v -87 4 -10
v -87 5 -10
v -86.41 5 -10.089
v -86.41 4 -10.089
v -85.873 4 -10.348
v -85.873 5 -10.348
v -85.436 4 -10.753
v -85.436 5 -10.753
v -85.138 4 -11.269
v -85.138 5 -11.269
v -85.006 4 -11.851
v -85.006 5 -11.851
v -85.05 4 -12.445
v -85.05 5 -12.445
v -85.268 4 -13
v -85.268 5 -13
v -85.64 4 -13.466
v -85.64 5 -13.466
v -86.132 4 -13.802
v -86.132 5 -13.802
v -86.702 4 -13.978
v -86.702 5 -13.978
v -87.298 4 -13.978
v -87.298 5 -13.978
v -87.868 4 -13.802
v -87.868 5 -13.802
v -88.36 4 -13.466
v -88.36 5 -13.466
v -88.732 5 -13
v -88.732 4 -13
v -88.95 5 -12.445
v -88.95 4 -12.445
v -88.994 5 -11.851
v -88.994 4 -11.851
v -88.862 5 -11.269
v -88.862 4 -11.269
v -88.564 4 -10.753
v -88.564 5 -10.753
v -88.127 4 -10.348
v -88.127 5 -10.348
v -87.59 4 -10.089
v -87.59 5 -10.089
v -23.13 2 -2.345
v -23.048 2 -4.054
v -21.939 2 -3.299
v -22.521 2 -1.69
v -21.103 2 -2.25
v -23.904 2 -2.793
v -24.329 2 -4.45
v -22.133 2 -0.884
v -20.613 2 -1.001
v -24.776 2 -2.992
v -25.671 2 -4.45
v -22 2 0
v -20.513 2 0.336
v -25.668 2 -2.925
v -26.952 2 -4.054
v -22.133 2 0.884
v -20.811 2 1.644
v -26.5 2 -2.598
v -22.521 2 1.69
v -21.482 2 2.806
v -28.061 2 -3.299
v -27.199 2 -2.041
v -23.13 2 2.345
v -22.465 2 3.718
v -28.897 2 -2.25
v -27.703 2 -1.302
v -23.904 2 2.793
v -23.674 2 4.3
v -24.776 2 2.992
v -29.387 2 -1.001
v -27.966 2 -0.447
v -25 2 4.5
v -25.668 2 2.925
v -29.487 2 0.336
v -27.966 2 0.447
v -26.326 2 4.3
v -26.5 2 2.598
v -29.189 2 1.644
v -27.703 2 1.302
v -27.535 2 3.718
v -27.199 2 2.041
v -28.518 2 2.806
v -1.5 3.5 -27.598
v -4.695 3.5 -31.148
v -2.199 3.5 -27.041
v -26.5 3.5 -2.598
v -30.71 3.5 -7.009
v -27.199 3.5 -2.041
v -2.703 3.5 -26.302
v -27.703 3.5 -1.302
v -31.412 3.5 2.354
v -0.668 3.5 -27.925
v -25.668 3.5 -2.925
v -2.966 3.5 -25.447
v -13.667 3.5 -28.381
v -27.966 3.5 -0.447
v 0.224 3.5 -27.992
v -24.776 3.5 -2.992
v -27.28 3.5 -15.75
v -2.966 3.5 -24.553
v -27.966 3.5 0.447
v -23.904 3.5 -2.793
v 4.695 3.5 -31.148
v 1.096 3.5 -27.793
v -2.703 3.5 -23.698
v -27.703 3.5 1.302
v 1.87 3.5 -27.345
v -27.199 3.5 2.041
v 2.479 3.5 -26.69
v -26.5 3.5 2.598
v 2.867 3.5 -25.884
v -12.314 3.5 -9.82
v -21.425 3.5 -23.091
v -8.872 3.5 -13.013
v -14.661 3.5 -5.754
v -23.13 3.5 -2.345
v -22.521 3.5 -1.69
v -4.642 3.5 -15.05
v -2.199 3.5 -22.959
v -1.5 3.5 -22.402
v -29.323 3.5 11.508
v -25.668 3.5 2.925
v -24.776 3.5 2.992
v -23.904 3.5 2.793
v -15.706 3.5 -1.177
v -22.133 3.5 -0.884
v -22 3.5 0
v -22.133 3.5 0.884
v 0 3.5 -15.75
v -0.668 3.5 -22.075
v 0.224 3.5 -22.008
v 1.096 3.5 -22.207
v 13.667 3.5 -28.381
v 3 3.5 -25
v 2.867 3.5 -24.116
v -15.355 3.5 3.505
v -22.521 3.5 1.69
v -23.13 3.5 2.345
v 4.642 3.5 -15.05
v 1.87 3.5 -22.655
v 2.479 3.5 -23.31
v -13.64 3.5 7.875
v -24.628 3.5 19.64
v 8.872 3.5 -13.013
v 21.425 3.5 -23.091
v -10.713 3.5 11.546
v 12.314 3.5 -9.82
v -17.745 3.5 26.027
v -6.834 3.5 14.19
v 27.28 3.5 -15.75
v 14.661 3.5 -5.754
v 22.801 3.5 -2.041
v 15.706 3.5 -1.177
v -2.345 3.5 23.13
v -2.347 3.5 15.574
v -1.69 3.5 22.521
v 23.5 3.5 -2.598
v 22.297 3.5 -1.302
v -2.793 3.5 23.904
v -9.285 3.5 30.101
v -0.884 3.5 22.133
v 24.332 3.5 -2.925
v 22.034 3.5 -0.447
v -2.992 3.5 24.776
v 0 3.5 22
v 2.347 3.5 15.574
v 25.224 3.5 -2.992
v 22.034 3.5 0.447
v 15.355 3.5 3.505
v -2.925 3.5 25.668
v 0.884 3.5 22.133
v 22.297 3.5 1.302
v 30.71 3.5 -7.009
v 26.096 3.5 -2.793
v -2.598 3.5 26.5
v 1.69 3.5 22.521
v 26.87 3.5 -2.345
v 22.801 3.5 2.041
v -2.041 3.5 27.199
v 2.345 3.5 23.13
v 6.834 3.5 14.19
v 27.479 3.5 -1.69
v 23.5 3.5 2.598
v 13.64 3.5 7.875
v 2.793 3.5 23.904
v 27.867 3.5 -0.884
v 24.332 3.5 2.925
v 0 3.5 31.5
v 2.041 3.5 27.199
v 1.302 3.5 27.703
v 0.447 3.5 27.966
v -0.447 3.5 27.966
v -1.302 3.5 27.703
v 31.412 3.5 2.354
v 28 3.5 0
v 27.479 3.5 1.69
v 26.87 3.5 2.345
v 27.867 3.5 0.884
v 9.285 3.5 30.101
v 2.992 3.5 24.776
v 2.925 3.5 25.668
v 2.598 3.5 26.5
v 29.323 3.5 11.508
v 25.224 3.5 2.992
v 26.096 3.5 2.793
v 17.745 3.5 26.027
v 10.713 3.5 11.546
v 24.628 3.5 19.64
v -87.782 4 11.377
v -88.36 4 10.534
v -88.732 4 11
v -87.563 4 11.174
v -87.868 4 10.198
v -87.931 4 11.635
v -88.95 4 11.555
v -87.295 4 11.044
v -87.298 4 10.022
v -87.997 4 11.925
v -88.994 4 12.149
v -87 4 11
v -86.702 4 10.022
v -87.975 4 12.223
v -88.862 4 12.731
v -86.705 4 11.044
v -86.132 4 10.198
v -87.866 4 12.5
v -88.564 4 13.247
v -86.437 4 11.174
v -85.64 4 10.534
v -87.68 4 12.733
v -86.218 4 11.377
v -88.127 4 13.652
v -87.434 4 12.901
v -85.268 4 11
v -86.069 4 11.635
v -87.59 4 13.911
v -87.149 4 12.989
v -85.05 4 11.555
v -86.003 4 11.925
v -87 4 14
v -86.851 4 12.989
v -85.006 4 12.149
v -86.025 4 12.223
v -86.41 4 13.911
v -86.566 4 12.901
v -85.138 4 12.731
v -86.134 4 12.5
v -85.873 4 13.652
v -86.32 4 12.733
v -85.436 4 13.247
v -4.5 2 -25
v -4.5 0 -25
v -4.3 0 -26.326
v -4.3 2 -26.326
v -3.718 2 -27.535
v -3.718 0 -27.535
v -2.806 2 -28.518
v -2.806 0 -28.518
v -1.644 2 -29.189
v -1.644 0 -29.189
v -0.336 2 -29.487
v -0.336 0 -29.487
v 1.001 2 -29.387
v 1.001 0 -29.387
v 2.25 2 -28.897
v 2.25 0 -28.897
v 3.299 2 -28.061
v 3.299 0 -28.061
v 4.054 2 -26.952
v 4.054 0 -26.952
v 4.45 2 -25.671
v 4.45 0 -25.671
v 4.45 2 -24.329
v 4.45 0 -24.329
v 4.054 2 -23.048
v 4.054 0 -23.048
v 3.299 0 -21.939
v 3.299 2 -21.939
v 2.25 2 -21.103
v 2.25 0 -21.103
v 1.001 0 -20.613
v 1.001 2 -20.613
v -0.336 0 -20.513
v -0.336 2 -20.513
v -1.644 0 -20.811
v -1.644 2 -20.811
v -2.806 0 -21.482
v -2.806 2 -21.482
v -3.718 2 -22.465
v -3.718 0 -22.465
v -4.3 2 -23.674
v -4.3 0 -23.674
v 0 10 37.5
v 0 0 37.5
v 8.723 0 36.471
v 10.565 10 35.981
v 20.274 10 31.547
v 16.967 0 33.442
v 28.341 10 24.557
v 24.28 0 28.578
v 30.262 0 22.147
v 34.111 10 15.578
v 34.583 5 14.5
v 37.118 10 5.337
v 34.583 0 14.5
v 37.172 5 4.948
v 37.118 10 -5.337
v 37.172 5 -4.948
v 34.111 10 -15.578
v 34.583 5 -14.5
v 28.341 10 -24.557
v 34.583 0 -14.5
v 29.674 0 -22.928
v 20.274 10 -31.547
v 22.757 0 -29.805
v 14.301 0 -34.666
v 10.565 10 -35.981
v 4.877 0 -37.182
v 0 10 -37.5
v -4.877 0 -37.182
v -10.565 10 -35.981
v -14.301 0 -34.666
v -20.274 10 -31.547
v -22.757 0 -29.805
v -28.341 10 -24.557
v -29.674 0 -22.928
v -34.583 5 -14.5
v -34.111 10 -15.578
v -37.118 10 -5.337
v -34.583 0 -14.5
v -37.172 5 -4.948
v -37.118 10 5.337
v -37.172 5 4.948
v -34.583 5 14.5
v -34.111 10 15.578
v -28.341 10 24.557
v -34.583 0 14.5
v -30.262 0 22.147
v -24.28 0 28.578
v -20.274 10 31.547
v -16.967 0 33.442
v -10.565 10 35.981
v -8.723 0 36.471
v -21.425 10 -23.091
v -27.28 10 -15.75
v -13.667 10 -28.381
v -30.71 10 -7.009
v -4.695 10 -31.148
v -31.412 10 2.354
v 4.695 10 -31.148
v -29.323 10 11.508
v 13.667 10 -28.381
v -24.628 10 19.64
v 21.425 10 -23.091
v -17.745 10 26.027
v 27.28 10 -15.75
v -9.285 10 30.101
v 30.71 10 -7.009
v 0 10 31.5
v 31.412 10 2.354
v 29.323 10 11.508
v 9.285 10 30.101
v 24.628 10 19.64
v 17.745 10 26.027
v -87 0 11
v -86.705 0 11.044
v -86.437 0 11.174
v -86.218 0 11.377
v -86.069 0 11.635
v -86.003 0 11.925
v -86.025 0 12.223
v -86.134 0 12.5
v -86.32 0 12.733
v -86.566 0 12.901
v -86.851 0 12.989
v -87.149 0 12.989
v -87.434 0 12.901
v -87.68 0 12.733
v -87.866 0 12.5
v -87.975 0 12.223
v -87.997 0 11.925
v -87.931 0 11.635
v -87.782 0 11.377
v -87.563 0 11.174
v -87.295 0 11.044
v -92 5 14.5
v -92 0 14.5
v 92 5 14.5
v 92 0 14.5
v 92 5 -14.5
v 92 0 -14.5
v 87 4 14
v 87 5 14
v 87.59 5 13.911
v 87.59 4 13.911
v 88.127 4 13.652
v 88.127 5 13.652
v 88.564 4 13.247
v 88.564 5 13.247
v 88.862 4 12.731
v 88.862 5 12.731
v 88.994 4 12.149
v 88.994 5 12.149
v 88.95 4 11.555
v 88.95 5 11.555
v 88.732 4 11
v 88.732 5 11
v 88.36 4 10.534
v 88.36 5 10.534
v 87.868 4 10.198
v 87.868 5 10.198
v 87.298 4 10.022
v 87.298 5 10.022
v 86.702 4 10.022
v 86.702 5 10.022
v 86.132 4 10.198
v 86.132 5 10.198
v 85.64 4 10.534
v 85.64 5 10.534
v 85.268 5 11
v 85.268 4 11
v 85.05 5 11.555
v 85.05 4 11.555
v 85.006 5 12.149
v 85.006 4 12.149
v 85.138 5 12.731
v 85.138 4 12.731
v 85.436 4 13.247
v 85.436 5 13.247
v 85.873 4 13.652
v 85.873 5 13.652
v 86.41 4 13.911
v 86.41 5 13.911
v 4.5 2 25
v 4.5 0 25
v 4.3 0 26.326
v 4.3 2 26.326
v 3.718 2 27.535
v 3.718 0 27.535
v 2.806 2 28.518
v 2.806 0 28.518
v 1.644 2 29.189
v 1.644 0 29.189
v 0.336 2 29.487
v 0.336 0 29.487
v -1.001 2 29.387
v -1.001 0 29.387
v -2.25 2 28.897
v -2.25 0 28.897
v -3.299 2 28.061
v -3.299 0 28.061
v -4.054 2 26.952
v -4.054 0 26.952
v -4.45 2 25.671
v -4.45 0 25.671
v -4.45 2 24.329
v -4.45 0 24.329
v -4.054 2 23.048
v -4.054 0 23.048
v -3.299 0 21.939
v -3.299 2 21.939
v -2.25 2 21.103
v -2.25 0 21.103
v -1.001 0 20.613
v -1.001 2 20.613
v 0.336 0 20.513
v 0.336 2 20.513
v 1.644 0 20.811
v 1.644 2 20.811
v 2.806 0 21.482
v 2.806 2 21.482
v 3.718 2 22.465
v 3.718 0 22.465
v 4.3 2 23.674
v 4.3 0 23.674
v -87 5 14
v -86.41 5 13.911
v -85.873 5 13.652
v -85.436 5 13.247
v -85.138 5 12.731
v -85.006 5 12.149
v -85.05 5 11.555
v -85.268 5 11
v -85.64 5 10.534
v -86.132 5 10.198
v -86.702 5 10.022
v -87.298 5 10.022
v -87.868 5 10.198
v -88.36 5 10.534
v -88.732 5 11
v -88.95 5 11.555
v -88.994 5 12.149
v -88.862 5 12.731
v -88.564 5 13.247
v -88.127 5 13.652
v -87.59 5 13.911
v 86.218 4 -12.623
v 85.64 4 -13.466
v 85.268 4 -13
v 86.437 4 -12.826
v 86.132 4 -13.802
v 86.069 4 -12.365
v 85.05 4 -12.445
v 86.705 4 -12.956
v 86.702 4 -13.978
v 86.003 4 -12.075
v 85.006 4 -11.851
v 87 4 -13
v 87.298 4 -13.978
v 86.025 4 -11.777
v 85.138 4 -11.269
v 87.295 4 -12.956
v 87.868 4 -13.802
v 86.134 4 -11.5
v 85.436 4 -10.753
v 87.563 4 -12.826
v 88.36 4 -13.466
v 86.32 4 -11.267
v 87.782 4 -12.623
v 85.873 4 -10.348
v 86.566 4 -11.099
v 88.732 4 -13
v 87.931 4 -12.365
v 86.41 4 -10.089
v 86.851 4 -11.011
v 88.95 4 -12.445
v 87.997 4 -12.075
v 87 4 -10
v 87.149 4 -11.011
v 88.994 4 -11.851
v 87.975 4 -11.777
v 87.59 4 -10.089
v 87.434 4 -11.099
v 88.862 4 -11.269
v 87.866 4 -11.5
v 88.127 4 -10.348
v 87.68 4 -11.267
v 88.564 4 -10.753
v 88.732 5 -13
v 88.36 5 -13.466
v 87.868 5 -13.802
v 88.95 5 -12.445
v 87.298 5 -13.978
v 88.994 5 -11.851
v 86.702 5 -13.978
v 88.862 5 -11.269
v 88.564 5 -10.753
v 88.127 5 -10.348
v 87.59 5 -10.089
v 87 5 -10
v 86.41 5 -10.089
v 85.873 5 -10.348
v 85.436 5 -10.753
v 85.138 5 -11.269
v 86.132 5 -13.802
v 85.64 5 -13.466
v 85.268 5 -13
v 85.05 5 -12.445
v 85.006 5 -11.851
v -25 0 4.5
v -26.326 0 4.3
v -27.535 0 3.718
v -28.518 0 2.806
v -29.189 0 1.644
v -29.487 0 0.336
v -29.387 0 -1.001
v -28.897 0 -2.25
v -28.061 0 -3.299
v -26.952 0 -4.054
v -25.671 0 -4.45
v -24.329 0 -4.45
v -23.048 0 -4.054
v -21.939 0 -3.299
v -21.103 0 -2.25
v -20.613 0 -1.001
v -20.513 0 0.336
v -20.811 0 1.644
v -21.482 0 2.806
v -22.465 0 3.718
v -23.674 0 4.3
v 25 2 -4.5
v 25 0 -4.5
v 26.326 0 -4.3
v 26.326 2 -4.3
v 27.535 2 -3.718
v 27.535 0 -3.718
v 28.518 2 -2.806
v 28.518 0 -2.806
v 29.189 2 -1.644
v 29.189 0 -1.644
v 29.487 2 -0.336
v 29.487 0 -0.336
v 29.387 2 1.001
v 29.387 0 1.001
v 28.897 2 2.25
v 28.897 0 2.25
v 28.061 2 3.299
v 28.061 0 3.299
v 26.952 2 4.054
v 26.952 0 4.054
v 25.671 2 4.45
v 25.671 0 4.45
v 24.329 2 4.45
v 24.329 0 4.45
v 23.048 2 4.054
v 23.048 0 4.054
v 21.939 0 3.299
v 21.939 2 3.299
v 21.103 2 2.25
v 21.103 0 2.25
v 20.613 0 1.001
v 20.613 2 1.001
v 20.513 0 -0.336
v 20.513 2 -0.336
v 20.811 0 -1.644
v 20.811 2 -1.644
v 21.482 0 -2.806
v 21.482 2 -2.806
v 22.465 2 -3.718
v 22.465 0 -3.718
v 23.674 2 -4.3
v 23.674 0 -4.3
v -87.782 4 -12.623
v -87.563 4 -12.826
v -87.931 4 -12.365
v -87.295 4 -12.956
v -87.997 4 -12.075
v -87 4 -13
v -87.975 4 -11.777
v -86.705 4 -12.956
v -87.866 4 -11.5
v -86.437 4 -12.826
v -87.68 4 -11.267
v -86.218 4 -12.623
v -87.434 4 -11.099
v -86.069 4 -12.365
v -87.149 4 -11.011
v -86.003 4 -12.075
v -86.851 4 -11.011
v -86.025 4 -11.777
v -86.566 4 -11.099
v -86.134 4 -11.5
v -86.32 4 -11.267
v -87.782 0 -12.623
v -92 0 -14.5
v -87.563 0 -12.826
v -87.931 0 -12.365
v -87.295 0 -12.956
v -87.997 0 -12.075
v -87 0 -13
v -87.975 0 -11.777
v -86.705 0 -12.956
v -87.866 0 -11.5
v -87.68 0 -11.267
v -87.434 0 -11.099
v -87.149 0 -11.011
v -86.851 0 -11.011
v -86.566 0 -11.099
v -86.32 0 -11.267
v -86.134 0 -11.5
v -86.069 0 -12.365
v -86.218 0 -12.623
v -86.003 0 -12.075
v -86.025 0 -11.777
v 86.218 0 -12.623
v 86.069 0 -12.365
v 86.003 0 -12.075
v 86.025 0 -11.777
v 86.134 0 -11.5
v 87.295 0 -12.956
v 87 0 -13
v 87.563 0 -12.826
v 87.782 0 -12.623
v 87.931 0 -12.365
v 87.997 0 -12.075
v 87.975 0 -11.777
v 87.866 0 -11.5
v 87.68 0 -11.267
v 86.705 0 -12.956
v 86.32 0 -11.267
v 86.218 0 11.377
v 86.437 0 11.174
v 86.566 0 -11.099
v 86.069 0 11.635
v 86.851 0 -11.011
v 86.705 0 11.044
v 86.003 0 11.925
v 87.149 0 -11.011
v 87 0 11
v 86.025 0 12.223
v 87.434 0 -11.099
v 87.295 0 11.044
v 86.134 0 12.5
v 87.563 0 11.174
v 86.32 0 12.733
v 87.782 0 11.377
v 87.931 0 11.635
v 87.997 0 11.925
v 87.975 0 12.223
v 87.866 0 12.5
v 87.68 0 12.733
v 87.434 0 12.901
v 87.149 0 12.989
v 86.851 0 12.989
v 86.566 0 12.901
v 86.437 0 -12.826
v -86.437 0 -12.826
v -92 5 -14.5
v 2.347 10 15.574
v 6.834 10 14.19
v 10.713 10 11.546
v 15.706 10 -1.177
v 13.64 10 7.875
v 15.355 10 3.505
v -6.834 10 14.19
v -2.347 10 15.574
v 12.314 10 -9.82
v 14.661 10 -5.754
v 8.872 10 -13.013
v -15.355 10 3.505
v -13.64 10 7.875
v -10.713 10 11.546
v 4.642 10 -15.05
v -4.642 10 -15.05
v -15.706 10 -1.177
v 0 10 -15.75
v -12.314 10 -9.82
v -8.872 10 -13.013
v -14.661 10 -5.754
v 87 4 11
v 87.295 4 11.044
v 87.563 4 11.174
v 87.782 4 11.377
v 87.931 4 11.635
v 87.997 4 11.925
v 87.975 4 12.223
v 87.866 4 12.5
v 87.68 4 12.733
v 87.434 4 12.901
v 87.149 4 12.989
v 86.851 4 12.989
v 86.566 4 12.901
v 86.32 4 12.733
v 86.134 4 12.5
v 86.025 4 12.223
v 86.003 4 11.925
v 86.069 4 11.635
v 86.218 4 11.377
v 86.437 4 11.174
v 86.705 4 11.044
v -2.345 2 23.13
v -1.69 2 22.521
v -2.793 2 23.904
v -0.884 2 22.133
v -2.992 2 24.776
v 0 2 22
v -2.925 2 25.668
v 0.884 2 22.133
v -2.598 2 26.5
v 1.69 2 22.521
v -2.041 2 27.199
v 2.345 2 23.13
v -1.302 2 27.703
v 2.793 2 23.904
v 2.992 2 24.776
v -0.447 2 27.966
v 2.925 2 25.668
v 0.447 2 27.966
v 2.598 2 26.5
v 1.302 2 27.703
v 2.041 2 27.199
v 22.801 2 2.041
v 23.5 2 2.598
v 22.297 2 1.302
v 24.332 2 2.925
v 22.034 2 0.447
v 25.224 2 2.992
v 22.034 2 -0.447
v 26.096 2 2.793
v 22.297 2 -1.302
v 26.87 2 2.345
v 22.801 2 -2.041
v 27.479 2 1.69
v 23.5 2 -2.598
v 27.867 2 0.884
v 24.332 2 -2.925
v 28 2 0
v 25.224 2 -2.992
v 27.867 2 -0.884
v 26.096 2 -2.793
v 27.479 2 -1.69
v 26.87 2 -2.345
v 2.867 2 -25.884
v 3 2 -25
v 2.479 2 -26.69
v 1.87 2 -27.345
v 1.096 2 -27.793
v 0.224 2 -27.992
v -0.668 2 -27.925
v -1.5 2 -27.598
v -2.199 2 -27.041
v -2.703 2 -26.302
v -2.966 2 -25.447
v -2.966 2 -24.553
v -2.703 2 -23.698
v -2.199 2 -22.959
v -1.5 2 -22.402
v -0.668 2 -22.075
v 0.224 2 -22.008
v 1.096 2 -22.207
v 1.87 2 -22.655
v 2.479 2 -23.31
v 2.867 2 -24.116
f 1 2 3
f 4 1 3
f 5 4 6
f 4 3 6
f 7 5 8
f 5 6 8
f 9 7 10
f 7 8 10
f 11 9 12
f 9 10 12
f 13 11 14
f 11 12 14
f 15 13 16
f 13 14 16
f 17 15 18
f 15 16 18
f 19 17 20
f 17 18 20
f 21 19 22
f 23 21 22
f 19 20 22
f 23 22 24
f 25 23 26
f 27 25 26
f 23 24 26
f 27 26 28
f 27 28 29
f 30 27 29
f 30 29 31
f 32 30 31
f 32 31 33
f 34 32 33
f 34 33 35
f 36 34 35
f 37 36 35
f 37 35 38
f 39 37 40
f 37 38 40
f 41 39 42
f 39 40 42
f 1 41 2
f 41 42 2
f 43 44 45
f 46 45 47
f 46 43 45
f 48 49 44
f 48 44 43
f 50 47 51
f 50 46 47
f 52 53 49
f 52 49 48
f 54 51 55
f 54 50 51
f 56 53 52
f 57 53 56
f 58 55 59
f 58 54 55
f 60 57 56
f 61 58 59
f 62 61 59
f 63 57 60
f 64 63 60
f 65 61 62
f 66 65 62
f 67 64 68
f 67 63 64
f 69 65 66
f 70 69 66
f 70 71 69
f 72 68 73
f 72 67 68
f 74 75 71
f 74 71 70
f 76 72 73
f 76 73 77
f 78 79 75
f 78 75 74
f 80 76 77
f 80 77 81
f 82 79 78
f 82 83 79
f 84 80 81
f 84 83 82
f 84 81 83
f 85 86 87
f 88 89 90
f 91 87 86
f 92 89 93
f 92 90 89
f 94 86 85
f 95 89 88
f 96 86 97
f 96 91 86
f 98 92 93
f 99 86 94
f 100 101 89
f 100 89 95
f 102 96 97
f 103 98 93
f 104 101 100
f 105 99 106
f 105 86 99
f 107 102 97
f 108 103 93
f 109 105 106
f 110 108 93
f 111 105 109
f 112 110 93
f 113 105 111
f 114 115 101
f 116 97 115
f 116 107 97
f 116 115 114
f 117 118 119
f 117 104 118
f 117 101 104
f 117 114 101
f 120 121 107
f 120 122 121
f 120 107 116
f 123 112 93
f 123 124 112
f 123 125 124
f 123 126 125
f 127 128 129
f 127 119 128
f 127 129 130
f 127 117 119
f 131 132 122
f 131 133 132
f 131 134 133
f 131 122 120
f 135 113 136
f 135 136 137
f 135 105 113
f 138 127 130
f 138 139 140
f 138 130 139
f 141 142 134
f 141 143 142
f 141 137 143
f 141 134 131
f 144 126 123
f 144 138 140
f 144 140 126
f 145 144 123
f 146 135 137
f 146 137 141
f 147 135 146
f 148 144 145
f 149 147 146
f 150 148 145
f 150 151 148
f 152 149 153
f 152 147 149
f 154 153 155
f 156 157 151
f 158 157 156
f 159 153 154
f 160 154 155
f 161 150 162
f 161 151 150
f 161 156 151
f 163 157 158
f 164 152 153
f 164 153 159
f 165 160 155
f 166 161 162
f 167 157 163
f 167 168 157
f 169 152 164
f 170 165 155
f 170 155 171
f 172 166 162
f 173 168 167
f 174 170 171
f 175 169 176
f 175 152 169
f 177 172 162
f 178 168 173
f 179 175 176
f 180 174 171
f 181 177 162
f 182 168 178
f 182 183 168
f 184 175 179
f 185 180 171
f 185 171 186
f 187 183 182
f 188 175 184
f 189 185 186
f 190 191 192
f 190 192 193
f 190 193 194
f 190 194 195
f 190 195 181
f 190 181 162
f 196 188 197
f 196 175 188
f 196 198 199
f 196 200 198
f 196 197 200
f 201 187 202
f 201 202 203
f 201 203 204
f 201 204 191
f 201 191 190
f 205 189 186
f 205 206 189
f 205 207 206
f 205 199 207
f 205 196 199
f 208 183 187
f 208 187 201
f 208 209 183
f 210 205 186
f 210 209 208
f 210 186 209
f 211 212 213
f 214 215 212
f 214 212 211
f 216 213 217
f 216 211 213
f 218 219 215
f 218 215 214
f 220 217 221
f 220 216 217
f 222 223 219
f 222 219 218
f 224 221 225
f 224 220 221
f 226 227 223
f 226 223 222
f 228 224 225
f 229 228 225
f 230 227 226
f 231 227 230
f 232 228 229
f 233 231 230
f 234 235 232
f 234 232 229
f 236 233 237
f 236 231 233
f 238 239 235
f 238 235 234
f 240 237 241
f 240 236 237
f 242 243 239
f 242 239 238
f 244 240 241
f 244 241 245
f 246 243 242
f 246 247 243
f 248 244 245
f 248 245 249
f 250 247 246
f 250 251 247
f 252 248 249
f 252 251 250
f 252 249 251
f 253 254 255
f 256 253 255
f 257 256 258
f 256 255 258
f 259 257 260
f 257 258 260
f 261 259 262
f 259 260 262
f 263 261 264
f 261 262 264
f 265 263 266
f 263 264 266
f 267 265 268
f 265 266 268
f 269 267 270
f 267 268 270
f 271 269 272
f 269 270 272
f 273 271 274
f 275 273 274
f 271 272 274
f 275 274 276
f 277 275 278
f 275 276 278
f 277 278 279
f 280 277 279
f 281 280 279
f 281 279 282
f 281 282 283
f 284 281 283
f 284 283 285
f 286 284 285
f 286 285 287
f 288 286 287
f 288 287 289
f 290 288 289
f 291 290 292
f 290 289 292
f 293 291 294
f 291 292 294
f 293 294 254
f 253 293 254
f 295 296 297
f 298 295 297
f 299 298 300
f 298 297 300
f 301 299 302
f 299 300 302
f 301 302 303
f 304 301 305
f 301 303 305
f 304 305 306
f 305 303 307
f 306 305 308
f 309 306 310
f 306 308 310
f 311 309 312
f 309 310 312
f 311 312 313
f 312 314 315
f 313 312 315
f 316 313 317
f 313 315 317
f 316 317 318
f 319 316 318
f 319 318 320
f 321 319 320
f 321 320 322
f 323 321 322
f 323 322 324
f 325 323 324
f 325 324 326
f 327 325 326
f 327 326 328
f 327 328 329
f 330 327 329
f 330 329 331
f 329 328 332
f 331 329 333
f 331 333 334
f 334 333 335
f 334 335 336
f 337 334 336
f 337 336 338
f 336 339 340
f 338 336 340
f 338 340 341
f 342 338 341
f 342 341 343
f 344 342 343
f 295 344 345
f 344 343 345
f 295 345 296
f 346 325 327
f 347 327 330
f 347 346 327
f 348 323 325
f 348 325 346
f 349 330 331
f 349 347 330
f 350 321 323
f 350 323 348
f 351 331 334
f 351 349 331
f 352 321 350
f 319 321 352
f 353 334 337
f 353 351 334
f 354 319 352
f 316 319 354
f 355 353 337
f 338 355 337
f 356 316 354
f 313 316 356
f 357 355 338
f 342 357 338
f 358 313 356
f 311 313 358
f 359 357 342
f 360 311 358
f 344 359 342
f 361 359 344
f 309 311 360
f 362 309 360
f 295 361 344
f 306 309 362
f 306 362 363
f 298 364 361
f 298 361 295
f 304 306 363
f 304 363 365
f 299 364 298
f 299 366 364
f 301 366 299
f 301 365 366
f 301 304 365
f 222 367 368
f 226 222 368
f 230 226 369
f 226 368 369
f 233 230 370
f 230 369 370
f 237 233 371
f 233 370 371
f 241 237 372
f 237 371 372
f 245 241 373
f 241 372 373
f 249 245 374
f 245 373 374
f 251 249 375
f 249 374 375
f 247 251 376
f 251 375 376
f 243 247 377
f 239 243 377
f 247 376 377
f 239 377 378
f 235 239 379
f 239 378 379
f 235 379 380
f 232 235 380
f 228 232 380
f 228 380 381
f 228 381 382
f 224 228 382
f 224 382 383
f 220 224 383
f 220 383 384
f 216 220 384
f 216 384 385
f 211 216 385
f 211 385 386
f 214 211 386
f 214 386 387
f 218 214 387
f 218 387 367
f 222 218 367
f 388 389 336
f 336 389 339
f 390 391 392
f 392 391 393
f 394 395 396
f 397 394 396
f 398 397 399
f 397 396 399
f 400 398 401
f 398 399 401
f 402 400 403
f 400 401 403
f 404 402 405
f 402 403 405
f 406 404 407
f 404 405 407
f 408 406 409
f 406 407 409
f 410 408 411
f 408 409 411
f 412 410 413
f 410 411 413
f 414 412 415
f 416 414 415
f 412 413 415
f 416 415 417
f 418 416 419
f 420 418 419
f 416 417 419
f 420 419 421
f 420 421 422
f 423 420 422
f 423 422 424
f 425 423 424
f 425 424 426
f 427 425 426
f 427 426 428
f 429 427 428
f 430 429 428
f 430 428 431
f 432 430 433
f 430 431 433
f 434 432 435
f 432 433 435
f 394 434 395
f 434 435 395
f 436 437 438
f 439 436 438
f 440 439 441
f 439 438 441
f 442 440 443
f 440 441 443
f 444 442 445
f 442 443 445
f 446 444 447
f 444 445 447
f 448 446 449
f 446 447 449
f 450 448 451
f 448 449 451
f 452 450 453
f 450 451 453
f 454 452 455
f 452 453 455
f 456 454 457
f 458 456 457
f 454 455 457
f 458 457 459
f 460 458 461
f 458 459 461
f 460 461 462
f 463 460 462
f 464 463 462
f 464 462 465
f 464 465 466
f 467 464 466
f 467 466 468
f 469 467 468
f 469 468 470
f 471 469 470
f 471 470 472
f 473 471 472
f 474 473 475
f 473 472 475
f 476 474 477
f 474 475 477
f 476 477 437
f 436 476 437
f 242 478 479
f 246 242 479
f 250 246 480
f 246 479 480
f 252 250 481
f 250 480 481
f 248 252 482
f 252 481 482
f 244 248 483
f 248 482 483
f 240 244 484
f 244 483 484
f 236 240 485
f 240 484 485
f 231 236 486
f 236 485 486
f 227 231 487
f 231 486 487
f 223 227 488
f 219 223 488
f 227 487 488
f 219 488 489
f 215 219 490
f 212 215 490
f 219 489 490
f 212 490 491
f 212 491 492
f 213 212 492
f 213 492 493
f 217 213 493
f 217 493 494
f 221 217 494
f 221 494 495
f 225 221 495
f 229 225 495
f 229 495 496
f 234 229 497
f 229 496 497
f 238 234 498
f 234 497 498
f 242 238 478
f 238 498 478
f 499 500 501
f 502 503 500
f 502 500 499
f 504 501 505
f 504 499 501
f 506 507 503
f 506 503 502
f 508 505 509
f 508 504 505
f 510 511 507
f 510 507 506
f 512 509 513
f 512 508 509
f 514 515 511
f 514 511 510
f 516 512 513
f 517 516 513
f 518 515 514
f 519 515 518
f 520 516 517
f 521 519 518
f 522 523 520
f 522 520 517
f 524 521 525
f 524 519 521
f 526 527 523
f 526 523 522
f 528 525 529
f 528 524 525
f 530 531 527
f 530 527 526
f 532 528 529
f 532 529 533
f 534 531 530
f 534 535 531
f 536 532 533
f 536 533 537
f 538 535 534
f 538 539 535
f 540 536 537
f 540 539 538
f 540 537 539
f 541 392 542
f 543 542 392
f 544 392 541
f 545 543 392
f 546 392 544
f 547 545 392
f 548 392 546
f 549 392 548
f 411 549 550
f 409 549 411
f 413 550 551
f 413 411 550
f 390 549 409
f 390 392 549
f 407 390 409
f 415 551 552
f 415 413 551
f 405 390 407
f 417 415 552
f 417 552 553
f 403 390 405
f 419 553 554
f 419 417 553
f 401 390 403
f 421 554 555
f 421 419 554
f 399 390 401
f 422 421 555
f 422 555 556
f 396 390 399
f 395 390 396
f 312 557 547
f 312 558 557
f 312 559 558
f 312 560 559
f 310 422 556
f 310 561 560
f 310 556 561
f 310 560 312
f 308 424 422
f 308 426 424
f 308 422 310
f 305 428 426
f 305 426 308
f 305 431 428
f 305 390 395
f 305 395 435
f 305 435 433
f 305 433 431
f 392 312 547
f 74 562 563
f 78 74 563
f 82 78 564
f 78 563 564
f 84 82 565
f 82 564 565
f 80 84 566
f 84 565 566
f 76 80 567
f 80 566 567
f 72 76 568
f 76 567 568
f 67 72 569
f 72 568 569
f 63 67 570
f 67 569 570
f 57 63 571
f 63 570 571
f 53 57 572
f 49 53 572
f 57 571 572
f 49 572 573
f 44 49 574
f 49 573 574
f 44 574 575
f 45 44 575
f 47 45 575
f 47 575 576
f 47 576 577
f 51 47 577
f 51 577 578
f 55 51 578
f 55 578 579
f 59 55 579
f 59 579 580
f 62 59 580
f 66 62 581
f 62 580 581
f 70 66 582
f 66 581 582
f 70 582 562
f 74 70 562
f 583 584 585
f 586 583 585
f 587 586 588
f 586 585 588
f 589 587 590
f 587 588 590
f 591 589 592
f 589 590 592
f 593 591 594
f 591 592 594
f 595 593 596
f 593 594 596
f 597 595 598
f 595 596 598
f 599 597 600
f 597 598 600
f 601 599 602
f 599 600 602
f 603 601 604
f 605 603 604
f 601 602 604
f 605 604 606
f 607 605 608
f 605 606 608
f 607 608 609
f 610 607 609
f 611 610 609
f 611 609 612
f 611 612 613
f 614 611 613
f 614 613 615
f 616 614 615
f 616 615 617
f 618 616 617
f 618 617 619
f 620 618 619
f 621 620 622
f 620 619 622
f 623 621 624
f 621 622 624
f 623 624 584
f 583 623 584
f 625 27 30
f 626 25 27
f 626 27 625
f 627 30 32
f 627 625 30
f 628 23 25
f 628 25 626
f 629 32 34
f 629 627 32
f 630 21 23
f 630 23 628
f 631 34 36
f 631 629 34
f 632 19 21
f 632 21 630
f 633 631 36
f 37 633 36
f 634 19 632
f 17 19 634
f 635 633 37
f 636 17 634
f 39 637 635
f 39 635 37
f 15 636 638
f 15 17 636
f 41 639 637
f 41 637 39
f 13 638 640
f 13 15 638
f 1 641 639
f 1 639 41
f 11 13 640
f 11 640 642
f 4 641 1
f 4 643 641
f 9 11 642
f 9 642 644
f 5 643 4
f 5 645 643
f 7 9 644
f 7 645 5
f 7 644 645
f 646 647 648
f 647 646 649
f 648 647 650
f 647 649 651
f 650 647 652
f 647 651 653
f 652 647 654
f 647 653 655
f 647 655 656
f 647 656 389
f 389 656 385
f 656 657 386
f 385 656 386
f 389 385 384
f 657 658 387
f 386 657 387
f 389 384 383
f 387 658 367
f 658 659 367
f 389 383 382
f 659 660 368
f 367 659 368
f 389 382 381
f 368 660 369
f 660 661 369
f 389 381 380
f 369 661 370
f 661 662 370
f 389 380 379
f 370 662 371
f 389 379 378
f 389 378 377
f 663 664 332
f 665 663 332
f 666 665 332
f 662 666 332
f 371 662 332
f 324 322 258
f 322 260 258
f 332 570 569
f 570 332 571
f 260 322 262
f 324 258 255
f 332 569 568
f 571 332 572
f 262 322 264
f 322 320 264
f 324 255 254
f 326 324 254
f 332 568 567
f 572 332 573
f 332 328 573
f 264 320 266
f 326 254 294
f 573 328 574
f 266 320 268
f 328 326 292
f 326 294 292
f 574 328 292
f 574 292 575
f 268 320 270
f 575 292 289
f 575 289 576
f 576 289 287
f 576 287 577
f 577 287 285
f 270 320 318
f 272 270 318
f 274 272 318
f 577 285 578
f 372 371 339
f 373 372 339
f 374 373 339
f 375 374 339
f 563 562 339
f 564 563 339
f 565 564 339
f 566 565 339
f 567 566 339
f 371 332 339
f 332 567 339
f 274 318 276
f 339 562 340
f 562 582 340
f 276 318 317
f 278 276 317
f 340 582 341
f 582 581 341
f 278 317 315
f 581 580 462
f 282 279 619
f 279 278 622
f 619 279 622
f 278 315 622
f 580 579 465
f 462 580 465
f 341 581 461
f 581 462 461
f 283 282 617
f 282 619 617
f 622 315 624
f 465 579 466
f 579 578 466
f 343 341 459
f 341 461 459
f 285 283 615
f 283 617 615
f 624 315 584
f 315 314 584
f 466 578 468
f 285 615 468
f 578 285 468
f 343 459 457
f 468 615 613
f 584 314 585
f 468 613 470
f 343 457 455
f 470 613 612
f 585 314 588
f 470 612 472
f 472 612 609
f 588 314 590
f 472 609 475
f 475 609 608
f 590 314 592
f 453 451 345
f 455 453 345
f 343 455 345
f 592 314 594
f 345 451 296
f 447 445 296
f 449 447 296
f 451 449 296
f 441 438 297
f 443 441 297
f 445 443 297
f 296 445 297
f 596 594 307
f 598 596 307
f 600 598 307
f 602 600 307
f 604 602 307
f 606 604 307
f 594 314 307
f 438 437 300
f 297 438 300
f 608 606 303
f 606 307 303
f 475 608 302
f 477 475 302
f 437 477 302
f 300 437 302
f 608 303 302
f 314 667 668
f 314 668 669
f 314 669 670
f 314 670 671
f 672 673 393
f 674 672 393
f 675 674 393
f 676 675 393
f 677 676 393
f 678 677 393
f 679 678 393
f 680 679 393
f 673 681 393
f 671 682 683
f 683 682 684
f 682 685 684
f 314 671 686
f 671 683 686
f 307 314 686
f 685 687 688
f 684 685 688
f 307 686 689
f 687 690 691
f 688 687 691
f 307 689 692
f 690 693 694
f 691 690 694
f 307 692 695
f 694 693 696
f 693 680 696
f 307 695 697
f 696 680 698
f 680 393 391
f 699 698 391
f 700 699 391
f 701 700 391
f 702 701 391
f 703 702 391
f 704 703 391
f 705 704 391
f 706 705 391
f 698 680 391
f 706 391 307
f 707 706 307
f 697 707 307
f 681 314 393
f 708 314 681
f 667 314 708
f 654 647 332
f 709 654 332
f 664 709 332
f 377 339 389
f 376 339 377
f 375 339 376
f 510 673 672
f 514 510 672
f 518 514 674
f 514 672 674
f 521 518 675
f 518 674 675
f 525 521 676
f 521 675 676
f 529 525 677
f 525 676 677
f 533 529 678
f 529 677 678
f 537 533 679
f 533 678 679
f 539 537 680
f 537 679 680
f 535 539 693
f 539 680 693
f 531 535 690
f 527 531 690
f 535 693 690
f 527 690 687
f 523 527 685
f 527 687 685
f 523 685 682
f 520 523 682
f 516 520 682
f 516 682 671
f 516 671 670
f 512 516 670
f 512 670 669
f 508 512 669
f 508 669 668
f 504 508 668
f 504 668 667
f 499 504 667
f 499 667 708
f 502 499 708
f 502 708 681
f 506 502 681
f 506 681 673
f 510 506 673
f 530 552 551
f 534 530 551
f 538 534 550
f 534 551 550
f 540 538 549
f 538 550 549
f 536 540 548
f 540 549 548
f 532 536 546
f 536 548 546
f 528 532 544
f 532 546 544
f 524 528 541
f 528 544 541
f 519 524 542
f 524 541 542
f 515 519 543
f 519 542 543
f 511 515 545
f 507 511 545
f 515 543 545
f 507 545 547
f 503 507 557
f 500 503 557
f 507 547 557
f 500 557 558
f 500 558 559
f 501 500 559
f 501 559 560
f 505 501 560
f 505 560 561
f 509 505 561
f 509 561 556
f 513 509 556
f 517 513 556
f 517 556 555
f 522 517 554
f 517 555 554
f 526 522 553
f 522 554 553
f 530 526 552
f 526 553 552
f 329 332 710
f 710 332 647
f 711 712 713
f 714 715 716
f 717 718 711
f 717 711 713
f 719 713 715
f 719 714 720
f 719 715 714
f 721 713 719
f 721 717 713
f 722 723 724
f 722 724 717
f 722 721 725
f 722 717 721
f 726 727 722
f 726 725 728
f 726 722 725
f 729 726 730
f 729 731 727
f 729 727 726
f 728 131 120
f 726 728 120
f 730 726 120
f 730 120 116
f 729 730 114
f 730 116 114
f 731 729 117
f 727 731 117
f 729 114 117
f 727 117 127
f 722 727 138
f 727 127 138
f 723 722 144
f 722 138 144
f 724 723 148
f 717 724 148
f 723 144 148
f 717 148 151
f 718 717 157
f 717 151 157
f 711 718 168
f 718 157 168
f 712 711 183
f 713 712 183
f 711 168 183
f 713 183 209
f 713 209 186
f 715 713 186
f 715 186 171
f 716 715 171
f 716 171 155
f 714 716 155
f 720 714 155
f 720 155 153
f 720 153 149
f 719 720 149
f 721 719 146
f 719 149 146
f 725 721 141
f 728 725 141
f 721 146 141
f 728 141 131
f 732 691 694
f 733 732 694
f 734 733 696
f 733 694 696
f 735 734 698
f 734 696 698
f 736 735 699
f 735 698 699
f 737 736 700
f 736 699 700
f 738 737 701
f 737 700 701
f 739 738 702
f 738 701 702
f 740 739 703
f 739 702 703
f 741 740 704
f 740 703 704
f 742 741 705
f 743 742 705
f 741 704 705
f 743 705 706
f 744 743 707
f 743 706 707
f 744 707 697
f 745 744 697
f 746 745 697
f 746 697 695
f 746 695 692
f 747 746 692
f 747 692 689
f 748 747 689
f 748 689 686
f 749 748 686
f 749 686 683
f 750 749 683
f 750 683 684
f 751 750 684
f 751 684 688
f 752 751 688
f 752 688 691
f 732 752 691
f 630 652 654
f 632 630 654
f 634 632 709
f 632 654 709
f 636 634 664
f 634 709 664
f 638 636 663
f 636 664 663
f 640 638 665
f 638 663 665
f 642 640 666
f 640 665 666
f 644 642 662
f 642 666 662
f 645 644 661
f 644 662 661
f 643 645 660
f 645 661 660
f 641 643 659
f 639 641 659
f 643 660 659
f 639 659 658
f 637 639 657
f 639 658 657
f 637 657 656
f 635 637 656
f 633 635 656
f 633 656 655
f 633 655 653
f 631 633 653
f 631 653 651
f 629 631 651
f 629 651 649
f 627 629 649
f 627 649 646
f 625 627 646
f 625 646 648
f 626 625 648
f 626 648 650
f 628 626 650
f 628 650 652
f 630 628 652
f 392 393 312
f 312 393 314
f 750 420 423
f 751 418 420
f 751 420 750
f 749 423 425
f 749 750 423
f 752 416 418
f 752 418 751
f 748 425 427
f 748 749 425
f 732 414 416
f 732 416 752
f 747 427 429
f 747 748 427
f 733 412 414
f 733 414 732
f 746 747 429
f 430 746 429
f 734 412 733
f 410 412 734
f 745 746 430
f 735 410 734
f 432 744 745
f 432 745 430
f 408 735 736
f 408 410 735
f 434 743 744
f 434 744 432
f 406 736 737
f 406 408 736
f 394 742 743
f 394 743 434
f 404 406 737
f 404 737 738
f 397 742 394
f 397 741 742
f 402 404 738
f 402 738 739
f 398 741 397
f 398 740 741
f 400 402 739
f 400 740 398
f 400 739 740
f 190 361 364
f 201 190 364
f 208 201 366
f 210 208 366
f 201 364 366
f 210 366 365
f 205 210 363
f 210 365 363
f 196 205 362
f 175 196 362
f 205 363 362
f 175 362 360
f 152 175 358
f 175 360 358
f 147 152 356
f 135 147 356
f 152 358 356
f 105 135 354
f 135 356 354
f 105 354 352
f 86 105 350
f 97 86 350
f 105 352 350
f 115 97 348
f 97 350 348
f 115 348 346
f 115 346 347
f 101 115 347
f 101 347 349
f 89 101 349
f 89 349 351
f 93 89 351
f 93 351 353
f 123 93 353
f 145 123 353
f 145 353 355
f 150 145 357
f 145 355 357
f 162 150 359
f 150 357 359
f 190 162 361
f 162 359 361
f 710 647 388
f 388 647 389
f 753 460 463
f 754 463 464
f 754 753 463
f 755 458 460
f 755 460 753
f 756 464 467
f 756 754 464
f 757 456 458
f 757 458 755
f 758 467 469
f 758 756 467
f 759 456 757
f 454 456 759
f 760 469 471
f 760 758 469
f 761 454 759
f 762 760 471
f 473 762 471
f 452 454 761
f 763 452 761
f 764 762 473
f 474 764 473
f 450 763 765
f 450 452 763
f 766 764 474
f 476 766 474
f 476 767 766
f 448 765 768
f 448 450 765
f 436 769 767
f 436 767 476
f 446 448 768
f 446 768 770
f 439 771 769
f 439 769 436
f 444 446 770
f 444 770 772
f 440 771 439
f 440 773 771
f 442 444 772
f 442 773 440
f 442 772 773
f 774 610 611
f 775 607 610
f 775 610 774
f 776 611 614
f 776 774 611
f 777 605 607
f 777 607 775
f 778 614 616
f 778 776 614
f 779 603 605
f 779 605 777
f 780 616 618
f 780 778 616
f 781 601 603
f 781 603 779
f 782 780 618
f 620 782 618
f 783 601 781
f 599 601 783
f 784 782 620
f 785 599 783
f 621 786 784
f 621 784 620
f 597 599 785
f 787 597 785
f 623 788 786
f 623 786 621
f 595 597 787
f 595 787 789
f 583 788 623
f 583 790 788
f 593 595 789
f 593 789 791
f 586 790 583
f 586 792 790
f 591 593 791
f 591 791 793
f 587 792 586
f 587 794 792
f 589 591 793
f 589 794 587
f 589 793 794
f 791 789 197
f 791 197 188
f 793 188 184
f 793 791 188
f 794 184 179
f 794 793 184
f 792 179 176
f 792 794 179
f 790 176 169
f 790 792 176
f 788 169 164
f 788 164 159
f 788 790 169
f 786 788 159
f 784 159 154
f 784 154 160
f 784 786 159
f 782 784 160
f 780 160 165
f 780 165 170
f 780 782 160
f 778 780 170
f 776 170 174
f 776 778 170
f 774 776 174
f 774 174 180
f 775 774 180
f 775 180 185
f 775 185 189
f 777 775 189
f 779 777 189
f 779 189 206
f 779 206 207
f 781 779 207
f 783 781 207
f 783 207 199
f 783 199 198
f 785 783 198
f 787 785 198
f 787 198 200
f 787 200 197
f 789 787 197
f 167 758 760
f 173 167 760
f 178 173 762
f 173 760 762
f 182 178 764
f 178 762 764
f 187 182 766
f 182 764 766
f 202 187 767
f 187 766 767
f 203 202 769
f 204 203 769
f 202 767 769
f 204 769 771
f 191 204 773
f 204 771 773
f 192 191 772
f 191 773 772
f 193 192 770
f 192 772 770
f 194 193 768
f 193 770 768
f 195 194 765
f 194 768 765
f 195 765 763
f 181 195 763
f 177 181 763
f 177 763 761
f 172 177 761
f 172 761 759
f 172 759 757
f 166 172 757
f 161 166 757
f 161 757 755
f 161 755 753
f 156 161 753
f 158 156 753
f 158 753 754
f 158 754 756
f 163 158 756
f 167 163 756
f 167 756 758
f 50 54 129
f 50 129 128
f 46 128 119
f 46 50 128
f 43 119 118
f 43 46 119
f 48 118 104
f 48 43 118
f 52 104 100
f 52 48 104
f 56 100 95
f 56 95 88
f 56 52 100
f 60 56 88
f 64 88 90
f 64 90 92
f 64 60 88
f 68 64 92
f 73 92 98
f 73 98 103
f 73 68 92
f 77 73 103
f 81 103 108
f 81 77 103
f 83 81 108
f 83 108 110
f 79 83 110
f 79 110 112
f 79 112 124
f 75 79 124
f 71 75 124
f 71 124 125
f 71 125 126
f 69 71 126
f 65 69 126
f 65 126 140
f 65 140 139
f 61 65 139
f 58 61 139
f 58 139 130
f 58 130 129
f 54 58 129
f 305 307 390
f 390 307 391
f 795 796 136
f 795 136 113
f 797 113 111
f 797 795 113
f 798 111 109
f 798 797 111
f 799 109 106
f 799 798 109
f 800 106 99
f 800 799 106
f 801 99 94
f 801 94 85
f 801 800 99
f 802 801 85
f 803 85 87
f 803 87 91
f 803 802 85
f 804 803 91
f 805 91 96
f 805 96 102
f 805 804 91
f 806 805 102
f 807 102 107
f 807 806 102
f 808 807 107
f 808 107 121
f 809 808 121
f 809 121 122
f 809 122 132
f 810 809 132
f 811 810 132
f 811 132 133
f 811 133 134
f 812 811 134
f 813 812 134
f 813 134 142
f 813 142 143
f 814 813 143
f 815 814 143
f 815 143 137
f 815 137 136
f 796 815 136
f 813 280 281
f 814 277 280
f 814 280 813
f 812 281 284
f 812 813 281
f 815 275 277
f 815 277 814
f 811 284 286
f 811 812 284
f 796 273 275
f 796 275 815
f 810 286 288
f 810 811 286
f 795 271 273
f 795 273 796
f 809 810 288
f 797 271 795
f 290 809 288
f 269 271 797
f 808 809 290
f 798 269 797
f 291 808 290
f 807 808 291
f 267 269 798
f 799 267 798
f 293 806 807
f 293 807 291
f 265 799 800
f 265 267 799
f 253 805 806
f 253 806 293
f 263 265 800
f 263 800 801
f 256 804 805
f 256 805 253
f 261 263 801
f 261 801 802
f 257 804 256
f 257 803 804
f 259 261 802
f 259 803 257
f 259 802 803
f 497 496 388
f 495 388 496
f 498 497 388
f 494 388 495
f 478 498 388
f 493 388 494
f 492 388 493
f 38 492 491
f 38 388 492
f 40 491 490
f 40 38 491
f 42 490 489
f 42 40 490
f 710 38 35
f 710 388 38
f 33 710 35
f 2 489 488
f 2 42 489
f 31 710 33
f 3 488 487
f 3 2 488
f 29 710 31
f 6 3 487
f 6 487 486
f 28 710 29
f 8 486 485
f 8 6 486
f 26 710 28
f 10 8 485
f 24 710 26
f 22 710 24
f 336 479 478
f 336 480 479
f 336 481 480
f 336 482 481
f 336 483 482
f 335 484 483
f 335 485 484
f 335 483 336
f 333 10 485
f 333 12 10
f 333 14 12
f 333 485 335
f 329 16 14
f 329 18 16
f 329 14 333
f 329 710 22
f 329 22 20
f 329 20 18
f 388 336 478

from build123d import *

# Parameters (mm, degrees)
SKETCH1_R             = 37.5
BOSS_EXTRUDE1_DEPTH   = 10
SKETCH2_R             = 31.5
CUT_EXTRUDE1_DEPTH    = 6.5
SKETCH4_R             = 15.75
BOSS_EXTRUDE2_DEPTH   = 6.5
SKETCH5_R             = 3
CUT_EXTRUDE2_DEPTH    = 3.5
CIRPATTERN3_OUTLINE_R = 3
CIRPATTERN3_DEPTH     = 3.5
BOSS_EXTRUDE3_DEPTH   = 5
CIRPATTERN4_COUNT     = 4
SKETCH9_R             = 4.5
CUT_EXTRUDE3_DEPTH    = 2
CIRPATTERN5_COUNT     = 4
SKETCH10_R            = 1
CUT_EXTRUDE4_DEPTH    = 5
LPATTERN1_COUNT       = 2
LPATTERN1_PITCH       = 174
LPATTERN1_COUNT_DIR2  = 2
LPATTERN1_PITCH_DIR2  = 24
SKETCH11_R            = 2
CUT_EXTRUDE5_DEPTH    = 1
LPATTERN2_COUNT       = 2
LPATTERN2_PITCH       = 174
LPATTERN2_COUNT_DIR2  = 2
LPATTERN2_PITCH_DIR2  = 24


# Read off the part's stored shape, not the designer's step: CirPattern3
with BuildPart() as part:
    # Sketch1 → Boss-Extrude1 (new body)
    with BuildSketch(Plane(origin=(0, 0, 0), x_dir=(1, 0, 0), z_dir=(0, 1, 0))):
        with Locations(Location((0, 0, 0), (0, 0, 270))):
            Circle(SKETCH1_R)
    extrude(amount=BOSS_EXTRUDE1_DEPTH)

    # Sketch2 → Cut-Extrude1 (cut)
    with BuildSketch(Plane(origin=(0, 10, 0), x_dir=(1, 0, 0), z_dir=(0, 1, 0))):
        with Locations(Location((0, 0, 0), (0, 0, 270))):
            Circle(SKETCH2_R)
    extrude(amount=-CUT_EXTRUDE1_DEPTH, mode=Mode.SUBTRACT)

    # Sketch4 → Boss-Extrude2 (add)
    with BuildSketch(Plane(origin=(0, 3.5, 0), x_dir=(1, 0, 0), z_dir=(0, 1, 0))):
        with Locations(Location((0, 0, 0), (0, 0, 90))):
            Circle(SKETCH4_R)
    extrude(amount=BOSS_EXTRUDE2_DEPTH)

    # Sketch5 → Cut-Extrude2 (cut)
    with BuildSketch(Plane.XZ):
        with Locations(Location((0, 25, 0), (0, 0, 270))):
            Circle(SKETCH5_R)
    extrude(amount=-CUT_EXTRUDE2_DEPTH, mode=Mode.SUBTRACT)

    # CirPattern3 outline → CirPattern3 (cut)
    with BuildSketch(Plane(origin=(0, 0, 0), x_dir=(1, 0, 0), z_dir=(0, 1, 0))):
        with Locations((-25, 0)):
            Circle(CIRPATTERN3_OUTLINE_R)
        with Locations((0, 25)):
            Circle(CIRPATTERN3_OUTLINE_R)
        with Locations((25, 0)):
            Circle(CIRPATTERN3_OUTLINE_R)
    extrude(amount=CIRPATTERN3_DEPTH, mode=Mode.SUBTRACT)

    # Sketch7 → Boss-Extrude3 (add)
    with BuildSketch(Plane.XZ):
        with BuildLine():
            Line((34.583232932, 14.5), (92.000000002, 14.5))
            Line((92.000000002, 14.5), (92.000000002, -14.5))
            Line((92.000000002, -14.5), (34.583232932, -14.5))
            ThreePointArc((34.583232932, -14.5), (37.5, 0), (34.583232932, 14.5))
        make_face()
    boss_extrude3 = extrude(amount=-BOSS_EXTRUDE3_DEPTH)

    # CirPattern4: Boss-Extrude3 ×4 about axis, 2 skipped
    cirpattern4_axis = Axis((0, 0, 0), (0, 1, 0))
    add([boss_extrude3.rotate(cirpattern4_axis, i * 360 / CIRPATTERN4_COUNT) for i in range(1, CIRPATTERN4_COUNT) if i not in (1, 3)])

    # Sketch9 → Cut-Extrude3 (cut)
    with BuildSketch(Plane.XZ):
        with Locations(Location((25, 0, 0), (0, 0, 270))):
            Circle(SKETCH9_R)
    cut_extrude3 = extrude(amount=-CUT_EXTRUDE3_DEPTH, mode=Mode.SUBTRACT)

    # CirPattern5: Cut-Extrude3 ×4 about axis
    cirpattern5_axis = Axis((0, 0, 0), (0, 1, 0))
    for i in range(1, CIRPATTERN5_COUNT):
        add(cut_extrude3.rotate(cirpattern5_axis, i * 360 / CIRPATTERN5_COUNT), mode=Mode.SUBTRACT)

    # Sketch10 → Cut-Extrude4 (cut)
    with BuildSketch(Plane(origin=(0, 0, 0), x_dir=(-1, 0, 0), z_dir=(0, -1, 0))):
        with Locations(Location((-87, -12, 0), (0, 0, 90))):
            Circle(SKETCH10_R)
    cut_extrude4 = extrude(amount=-CUT_EXTRUDE4_DEPTH, mode=Mode.SUBTRACT)

    # LPattern1: Cut-Extrude4 2 × 2
    with Locations(*[(-i * LPATTERN1_PITCH, 0, -j * LPATTERN1_PITCH_DIR2) for i in range(LPATTERN1_COUNT) for j in range(LPATTERN1_COUNT_DIR2) if (i, j) != (0, 0)]):
        add(cut_extrude4, mode=Mode.SUBTRACT)

    # Sketch11 → Cut-Extrude5 (cut)
    with BuildSketch(Plane(origin=(0, 5, 0), x_dir=(1, 0, 0), z_dir=(0, 1, 0))):
        with Locations(Location((87, -12, 0), (0, 0, 270))):
            Circle(SKETCH11_R)
    cut_extrude5 = extrude(amount=-CUT_EXTRUDE5_DEPTH, mode=Mode.SUBTRACT)

    # LPattern2: Cut-Extrude5 2 × 2
    with Locations(*[(-i * LPATTERN2_PITCH, 0, -j * LPATTERN2_PITCH_DIR2) for i in range(LPATTERN2_COUNT) for j in range(LPATTERN2_COUNT_DIR2) if (i, j) != (0, 0)]):
        add(cut_extrude5, mode=Mode.SUBTRACT)


solid = part.part
